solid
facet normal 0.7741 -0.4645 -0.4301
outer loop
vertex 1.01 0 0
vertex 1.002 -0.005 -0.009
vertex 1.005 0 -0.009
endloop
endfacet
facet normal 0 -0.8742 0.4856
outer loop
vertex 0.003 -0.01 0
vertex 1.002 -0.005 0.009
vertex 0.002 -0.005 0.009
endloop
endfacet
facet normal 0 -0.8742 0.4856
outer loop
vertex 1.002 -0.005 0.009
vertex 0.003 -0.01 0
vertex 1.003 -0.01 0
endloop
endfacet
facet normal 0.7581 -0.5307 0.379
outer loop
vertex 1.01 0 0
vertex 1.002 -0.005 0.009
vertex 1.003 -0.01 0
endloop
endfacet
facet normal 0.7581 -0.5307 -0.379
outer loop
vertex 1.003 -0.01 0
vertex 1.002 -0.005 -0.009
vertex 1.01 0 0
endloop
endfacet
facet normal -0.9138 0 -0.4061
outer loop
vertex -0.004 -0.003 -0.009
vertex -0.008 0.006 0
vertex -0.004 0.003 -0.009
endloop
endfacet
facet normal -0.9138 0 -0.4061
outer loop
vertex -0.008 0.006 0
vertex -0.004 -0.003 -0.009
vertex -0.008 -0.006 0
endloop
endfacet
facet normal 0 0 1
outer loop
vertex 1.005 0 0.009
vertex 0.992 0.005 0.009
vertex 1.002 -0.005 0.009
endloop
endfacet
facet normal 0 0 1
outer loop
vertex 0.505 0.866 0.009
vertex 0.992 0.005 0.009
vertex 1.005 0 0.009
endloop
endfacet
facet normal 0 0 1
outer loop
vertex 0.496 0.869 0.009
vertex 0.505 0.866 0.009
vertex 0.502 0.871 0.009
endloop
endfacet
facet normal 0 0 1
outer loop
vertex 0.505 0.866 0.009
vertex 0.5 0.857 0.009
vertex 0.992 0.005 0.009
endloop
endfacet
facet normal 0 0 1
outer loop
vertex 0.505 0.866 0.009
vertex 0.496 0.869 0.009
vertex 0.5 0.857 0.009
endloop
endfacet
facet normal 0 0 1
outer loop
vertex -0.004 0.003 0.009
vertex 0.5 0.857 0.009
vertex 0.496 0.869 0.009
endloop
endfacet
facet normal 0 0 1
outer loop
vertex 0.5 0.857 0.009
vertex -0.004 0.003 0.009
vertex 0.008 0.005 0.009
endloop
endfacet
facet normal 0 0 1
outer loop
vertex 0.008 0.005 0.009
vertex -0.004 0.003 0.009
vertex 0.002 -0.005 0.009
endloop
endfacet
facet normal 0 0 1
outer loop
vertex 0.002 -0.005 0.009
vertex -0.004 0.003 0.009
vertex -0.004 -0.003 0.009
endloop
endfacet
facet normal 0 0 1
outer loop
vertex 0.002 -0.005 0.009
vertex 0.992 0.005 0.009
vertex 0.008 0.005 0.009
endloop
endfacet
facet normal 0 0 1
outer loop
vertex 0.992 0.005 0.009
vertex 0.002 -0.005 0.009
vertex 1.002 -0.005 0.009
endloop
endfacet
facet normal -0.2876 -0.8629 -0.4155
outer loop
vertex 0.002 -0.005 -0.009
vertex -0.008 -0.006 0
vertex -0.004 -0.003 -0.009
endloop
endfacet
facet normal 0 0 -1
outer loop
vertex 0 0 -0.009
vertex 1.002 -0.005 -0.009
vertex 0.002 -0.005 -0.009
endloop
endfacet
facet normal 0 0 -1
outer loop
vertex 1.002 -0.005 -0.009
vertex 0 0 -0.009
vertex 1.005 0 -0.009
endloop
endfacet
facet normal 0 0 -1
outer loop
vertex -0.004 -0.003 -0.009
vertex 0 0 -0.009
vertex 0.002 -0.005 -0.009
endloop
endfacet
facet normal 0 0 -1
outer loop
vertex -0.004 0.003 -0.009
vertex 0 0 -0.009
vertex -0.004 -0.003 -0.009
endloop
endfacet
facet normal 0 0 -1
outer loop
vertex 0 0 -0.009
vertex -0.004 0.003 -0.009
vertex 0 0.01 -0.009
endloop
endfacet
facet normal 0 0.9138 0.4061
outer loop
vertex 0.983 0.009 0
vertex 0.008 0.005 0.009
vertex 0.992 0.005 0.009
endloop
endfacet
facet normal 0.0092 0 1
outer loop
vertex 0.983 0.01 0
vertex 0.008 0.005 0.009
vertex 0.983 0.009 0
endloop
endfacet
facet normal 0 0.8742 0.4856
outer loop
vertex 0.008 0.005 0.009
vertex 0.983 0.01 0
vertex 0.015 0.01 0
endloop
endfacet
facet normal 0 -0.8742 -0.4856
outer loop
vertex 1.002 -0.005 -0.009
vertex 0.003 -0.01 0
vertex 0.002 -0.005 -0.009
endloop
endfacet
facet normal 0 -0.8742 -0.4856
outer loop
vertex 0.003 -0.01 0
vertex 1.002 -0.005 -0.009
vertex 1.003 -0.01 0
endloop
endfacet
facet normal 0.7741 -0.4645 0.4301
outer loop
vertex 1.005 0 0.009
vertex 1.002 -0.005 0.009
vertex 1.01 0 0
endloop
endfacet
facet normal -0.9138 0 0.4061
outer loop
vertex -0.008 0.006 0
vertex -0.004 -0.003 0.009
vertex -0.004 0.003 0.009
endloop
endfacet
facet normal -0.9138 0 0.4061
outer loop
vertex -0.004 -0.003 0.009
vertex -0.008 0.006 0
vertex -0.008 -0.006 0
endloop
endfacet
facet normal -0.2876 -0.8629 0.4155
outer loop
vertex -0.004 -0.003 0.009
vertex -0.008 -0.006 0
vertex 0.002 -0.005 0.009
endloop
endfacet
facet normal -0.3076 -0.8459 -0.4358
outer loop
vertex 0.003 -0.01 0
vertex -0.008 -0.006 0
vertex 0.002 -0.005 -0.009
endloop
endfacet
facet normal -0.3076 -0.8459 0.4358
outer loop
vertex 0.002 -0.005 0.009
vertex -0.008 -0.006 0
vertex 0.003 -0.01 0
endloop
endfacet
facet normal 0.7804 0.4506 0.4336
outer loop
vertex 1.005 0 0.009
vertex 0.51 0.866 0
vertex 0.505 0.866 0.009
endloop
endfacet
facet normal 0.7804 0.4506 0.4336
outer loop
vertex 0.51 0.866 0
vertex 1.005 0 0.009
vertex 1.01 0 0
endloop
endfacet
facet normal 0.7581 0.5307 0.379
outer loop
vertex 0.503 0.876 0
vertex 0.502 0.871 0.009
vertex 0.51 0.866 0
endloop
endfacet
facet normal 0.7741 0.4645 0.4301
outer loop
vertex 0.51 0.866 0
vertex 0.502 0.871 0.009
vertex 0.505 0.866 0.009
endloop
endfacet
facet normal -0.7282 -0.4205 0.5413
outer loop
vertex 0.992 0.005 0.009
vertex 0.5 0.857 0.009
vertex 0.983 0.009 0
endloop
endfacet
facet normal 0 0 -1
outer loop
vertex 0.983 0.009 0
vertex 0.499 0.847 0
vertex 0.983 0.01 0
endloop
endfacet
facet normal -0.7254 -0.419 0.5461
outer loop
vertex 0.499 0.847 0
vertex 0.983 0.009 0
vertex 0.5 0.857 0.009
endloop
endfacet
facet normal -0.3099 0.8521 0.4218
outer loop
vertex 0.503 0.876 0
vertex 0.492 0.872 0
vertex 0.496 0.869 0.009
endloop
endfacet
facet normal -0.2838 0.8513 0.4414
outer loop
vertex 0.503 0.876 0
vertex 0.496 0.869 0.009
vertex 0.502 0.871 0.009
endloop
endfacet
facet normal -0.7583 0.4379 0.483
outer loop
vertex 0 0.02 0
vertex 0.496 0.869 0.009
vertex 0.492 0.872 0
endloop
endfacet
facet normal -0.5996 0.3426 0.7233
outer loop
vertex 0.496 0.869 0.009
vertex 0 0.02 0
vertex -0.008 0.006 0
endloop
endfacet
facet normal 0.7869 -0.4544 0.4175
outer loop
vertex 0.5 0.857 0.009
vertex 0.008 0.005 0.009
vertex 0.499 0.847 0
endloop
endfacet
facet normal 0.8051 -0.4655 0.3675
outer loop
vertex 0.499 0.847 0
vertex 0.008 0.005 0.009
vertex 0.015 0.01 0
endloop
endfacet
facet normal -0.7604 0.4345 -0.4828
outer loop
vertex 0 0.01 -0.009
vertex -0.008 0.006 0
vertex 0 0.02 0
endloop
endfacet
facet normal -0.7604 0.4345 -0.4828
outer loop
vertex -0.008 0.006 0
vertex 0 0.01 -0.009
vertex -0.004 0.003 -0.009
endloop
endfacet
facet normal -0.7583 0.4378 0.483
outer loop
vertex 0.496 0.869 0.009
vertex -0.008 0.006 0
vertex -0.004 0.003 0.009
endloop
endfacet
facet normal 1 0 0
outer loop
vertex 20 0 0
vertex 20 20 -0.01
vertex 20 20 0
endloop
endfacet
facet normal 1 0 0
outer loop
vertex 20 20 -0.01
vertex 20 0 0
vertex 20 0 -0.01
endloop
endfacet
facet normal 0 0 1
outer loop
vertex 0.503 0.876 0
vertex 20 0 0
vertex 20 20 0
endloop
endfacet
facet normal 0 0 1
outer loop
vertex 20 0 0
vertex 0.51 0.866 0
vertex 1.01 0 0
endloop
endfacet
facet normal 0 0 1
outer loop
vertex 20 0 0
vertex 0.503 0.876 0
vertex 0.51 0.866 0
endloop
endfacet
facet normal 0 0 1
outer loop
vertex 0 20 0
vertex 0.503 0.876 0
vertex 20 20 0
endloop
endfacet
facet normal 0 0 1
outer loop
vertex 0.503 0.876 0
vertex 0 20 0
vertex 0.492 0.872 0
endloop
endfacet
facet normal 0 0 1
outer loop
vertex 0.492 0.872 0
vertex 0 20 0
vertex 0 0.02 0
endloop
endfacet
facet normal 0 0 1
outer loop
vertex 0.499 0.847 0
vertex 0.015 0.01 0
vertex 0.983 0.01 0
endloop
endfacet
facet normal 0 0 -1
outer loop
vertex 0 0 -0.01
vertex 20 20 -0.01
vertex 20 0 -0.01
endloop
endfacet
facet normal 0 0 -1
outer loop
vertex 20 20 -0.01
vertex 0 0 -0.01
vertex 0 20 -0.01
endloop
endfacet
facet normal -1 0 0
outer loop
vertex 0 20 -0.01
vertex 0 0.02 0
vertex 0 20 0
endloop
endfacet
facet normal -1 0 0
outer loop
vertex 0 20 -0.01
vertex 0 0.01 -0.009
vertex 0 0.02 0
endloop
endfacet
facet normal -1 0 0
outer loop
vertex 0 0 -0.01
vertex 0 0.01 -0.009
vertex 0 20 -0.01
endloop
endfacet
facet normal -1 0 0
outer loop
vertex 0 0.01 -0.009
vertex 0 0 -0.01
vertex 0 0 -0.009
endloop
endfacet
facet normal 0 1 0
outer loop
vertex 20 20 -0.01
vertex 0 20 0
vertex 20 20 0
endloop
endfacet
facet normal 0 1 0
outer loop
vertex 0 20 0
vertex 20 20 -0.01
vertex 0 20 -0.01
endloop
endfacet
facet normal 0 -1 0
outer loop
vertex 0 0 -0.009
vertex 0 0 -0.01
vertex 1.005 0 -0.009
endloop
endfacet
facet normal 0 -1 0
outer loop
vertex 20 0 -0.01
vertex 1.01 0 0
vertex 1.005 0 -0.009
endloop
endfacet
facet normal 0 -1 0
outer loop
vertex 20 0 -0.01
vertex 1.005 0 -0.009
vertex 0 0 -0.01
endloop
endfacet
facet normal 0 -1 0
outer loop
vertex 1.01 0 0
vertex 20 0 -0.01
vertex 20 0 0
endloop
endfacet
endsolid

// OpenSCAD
hull(){
    translate([0.0, 0.0]) sphere(0.01);
    translate([1.0, 0.0]) sphere(0.01);
}
hull(){
    translate([1.0, 0.0]) sphere(0.01);
    translate([0.5, 0.8660254038]) sphere(0.01);
}
hull(){
    translate([0.5, 0.8660254038]) sphere(0.01);
    translate([0.0, 0.0]) sphere(0.01);
}
hull(){
    translate([0.0, 0.0]) sphere(0.01);
    translate([0.0, 0.0]) sphere(0.01);
}
hull(){
    translate([0.0, 0.0]) sphere(0.01);
    translate([0.0, 0.0]) sphere(0.01);
}
hull(){
    translate([0.0, 0.0]) sphere(0.01);
    translate([0.0, 0.0]) sphere(0.01);
}
translate([0,0,-0.01]) color([0.1,0.1,0.1]) cube([20,20,0.01]);
